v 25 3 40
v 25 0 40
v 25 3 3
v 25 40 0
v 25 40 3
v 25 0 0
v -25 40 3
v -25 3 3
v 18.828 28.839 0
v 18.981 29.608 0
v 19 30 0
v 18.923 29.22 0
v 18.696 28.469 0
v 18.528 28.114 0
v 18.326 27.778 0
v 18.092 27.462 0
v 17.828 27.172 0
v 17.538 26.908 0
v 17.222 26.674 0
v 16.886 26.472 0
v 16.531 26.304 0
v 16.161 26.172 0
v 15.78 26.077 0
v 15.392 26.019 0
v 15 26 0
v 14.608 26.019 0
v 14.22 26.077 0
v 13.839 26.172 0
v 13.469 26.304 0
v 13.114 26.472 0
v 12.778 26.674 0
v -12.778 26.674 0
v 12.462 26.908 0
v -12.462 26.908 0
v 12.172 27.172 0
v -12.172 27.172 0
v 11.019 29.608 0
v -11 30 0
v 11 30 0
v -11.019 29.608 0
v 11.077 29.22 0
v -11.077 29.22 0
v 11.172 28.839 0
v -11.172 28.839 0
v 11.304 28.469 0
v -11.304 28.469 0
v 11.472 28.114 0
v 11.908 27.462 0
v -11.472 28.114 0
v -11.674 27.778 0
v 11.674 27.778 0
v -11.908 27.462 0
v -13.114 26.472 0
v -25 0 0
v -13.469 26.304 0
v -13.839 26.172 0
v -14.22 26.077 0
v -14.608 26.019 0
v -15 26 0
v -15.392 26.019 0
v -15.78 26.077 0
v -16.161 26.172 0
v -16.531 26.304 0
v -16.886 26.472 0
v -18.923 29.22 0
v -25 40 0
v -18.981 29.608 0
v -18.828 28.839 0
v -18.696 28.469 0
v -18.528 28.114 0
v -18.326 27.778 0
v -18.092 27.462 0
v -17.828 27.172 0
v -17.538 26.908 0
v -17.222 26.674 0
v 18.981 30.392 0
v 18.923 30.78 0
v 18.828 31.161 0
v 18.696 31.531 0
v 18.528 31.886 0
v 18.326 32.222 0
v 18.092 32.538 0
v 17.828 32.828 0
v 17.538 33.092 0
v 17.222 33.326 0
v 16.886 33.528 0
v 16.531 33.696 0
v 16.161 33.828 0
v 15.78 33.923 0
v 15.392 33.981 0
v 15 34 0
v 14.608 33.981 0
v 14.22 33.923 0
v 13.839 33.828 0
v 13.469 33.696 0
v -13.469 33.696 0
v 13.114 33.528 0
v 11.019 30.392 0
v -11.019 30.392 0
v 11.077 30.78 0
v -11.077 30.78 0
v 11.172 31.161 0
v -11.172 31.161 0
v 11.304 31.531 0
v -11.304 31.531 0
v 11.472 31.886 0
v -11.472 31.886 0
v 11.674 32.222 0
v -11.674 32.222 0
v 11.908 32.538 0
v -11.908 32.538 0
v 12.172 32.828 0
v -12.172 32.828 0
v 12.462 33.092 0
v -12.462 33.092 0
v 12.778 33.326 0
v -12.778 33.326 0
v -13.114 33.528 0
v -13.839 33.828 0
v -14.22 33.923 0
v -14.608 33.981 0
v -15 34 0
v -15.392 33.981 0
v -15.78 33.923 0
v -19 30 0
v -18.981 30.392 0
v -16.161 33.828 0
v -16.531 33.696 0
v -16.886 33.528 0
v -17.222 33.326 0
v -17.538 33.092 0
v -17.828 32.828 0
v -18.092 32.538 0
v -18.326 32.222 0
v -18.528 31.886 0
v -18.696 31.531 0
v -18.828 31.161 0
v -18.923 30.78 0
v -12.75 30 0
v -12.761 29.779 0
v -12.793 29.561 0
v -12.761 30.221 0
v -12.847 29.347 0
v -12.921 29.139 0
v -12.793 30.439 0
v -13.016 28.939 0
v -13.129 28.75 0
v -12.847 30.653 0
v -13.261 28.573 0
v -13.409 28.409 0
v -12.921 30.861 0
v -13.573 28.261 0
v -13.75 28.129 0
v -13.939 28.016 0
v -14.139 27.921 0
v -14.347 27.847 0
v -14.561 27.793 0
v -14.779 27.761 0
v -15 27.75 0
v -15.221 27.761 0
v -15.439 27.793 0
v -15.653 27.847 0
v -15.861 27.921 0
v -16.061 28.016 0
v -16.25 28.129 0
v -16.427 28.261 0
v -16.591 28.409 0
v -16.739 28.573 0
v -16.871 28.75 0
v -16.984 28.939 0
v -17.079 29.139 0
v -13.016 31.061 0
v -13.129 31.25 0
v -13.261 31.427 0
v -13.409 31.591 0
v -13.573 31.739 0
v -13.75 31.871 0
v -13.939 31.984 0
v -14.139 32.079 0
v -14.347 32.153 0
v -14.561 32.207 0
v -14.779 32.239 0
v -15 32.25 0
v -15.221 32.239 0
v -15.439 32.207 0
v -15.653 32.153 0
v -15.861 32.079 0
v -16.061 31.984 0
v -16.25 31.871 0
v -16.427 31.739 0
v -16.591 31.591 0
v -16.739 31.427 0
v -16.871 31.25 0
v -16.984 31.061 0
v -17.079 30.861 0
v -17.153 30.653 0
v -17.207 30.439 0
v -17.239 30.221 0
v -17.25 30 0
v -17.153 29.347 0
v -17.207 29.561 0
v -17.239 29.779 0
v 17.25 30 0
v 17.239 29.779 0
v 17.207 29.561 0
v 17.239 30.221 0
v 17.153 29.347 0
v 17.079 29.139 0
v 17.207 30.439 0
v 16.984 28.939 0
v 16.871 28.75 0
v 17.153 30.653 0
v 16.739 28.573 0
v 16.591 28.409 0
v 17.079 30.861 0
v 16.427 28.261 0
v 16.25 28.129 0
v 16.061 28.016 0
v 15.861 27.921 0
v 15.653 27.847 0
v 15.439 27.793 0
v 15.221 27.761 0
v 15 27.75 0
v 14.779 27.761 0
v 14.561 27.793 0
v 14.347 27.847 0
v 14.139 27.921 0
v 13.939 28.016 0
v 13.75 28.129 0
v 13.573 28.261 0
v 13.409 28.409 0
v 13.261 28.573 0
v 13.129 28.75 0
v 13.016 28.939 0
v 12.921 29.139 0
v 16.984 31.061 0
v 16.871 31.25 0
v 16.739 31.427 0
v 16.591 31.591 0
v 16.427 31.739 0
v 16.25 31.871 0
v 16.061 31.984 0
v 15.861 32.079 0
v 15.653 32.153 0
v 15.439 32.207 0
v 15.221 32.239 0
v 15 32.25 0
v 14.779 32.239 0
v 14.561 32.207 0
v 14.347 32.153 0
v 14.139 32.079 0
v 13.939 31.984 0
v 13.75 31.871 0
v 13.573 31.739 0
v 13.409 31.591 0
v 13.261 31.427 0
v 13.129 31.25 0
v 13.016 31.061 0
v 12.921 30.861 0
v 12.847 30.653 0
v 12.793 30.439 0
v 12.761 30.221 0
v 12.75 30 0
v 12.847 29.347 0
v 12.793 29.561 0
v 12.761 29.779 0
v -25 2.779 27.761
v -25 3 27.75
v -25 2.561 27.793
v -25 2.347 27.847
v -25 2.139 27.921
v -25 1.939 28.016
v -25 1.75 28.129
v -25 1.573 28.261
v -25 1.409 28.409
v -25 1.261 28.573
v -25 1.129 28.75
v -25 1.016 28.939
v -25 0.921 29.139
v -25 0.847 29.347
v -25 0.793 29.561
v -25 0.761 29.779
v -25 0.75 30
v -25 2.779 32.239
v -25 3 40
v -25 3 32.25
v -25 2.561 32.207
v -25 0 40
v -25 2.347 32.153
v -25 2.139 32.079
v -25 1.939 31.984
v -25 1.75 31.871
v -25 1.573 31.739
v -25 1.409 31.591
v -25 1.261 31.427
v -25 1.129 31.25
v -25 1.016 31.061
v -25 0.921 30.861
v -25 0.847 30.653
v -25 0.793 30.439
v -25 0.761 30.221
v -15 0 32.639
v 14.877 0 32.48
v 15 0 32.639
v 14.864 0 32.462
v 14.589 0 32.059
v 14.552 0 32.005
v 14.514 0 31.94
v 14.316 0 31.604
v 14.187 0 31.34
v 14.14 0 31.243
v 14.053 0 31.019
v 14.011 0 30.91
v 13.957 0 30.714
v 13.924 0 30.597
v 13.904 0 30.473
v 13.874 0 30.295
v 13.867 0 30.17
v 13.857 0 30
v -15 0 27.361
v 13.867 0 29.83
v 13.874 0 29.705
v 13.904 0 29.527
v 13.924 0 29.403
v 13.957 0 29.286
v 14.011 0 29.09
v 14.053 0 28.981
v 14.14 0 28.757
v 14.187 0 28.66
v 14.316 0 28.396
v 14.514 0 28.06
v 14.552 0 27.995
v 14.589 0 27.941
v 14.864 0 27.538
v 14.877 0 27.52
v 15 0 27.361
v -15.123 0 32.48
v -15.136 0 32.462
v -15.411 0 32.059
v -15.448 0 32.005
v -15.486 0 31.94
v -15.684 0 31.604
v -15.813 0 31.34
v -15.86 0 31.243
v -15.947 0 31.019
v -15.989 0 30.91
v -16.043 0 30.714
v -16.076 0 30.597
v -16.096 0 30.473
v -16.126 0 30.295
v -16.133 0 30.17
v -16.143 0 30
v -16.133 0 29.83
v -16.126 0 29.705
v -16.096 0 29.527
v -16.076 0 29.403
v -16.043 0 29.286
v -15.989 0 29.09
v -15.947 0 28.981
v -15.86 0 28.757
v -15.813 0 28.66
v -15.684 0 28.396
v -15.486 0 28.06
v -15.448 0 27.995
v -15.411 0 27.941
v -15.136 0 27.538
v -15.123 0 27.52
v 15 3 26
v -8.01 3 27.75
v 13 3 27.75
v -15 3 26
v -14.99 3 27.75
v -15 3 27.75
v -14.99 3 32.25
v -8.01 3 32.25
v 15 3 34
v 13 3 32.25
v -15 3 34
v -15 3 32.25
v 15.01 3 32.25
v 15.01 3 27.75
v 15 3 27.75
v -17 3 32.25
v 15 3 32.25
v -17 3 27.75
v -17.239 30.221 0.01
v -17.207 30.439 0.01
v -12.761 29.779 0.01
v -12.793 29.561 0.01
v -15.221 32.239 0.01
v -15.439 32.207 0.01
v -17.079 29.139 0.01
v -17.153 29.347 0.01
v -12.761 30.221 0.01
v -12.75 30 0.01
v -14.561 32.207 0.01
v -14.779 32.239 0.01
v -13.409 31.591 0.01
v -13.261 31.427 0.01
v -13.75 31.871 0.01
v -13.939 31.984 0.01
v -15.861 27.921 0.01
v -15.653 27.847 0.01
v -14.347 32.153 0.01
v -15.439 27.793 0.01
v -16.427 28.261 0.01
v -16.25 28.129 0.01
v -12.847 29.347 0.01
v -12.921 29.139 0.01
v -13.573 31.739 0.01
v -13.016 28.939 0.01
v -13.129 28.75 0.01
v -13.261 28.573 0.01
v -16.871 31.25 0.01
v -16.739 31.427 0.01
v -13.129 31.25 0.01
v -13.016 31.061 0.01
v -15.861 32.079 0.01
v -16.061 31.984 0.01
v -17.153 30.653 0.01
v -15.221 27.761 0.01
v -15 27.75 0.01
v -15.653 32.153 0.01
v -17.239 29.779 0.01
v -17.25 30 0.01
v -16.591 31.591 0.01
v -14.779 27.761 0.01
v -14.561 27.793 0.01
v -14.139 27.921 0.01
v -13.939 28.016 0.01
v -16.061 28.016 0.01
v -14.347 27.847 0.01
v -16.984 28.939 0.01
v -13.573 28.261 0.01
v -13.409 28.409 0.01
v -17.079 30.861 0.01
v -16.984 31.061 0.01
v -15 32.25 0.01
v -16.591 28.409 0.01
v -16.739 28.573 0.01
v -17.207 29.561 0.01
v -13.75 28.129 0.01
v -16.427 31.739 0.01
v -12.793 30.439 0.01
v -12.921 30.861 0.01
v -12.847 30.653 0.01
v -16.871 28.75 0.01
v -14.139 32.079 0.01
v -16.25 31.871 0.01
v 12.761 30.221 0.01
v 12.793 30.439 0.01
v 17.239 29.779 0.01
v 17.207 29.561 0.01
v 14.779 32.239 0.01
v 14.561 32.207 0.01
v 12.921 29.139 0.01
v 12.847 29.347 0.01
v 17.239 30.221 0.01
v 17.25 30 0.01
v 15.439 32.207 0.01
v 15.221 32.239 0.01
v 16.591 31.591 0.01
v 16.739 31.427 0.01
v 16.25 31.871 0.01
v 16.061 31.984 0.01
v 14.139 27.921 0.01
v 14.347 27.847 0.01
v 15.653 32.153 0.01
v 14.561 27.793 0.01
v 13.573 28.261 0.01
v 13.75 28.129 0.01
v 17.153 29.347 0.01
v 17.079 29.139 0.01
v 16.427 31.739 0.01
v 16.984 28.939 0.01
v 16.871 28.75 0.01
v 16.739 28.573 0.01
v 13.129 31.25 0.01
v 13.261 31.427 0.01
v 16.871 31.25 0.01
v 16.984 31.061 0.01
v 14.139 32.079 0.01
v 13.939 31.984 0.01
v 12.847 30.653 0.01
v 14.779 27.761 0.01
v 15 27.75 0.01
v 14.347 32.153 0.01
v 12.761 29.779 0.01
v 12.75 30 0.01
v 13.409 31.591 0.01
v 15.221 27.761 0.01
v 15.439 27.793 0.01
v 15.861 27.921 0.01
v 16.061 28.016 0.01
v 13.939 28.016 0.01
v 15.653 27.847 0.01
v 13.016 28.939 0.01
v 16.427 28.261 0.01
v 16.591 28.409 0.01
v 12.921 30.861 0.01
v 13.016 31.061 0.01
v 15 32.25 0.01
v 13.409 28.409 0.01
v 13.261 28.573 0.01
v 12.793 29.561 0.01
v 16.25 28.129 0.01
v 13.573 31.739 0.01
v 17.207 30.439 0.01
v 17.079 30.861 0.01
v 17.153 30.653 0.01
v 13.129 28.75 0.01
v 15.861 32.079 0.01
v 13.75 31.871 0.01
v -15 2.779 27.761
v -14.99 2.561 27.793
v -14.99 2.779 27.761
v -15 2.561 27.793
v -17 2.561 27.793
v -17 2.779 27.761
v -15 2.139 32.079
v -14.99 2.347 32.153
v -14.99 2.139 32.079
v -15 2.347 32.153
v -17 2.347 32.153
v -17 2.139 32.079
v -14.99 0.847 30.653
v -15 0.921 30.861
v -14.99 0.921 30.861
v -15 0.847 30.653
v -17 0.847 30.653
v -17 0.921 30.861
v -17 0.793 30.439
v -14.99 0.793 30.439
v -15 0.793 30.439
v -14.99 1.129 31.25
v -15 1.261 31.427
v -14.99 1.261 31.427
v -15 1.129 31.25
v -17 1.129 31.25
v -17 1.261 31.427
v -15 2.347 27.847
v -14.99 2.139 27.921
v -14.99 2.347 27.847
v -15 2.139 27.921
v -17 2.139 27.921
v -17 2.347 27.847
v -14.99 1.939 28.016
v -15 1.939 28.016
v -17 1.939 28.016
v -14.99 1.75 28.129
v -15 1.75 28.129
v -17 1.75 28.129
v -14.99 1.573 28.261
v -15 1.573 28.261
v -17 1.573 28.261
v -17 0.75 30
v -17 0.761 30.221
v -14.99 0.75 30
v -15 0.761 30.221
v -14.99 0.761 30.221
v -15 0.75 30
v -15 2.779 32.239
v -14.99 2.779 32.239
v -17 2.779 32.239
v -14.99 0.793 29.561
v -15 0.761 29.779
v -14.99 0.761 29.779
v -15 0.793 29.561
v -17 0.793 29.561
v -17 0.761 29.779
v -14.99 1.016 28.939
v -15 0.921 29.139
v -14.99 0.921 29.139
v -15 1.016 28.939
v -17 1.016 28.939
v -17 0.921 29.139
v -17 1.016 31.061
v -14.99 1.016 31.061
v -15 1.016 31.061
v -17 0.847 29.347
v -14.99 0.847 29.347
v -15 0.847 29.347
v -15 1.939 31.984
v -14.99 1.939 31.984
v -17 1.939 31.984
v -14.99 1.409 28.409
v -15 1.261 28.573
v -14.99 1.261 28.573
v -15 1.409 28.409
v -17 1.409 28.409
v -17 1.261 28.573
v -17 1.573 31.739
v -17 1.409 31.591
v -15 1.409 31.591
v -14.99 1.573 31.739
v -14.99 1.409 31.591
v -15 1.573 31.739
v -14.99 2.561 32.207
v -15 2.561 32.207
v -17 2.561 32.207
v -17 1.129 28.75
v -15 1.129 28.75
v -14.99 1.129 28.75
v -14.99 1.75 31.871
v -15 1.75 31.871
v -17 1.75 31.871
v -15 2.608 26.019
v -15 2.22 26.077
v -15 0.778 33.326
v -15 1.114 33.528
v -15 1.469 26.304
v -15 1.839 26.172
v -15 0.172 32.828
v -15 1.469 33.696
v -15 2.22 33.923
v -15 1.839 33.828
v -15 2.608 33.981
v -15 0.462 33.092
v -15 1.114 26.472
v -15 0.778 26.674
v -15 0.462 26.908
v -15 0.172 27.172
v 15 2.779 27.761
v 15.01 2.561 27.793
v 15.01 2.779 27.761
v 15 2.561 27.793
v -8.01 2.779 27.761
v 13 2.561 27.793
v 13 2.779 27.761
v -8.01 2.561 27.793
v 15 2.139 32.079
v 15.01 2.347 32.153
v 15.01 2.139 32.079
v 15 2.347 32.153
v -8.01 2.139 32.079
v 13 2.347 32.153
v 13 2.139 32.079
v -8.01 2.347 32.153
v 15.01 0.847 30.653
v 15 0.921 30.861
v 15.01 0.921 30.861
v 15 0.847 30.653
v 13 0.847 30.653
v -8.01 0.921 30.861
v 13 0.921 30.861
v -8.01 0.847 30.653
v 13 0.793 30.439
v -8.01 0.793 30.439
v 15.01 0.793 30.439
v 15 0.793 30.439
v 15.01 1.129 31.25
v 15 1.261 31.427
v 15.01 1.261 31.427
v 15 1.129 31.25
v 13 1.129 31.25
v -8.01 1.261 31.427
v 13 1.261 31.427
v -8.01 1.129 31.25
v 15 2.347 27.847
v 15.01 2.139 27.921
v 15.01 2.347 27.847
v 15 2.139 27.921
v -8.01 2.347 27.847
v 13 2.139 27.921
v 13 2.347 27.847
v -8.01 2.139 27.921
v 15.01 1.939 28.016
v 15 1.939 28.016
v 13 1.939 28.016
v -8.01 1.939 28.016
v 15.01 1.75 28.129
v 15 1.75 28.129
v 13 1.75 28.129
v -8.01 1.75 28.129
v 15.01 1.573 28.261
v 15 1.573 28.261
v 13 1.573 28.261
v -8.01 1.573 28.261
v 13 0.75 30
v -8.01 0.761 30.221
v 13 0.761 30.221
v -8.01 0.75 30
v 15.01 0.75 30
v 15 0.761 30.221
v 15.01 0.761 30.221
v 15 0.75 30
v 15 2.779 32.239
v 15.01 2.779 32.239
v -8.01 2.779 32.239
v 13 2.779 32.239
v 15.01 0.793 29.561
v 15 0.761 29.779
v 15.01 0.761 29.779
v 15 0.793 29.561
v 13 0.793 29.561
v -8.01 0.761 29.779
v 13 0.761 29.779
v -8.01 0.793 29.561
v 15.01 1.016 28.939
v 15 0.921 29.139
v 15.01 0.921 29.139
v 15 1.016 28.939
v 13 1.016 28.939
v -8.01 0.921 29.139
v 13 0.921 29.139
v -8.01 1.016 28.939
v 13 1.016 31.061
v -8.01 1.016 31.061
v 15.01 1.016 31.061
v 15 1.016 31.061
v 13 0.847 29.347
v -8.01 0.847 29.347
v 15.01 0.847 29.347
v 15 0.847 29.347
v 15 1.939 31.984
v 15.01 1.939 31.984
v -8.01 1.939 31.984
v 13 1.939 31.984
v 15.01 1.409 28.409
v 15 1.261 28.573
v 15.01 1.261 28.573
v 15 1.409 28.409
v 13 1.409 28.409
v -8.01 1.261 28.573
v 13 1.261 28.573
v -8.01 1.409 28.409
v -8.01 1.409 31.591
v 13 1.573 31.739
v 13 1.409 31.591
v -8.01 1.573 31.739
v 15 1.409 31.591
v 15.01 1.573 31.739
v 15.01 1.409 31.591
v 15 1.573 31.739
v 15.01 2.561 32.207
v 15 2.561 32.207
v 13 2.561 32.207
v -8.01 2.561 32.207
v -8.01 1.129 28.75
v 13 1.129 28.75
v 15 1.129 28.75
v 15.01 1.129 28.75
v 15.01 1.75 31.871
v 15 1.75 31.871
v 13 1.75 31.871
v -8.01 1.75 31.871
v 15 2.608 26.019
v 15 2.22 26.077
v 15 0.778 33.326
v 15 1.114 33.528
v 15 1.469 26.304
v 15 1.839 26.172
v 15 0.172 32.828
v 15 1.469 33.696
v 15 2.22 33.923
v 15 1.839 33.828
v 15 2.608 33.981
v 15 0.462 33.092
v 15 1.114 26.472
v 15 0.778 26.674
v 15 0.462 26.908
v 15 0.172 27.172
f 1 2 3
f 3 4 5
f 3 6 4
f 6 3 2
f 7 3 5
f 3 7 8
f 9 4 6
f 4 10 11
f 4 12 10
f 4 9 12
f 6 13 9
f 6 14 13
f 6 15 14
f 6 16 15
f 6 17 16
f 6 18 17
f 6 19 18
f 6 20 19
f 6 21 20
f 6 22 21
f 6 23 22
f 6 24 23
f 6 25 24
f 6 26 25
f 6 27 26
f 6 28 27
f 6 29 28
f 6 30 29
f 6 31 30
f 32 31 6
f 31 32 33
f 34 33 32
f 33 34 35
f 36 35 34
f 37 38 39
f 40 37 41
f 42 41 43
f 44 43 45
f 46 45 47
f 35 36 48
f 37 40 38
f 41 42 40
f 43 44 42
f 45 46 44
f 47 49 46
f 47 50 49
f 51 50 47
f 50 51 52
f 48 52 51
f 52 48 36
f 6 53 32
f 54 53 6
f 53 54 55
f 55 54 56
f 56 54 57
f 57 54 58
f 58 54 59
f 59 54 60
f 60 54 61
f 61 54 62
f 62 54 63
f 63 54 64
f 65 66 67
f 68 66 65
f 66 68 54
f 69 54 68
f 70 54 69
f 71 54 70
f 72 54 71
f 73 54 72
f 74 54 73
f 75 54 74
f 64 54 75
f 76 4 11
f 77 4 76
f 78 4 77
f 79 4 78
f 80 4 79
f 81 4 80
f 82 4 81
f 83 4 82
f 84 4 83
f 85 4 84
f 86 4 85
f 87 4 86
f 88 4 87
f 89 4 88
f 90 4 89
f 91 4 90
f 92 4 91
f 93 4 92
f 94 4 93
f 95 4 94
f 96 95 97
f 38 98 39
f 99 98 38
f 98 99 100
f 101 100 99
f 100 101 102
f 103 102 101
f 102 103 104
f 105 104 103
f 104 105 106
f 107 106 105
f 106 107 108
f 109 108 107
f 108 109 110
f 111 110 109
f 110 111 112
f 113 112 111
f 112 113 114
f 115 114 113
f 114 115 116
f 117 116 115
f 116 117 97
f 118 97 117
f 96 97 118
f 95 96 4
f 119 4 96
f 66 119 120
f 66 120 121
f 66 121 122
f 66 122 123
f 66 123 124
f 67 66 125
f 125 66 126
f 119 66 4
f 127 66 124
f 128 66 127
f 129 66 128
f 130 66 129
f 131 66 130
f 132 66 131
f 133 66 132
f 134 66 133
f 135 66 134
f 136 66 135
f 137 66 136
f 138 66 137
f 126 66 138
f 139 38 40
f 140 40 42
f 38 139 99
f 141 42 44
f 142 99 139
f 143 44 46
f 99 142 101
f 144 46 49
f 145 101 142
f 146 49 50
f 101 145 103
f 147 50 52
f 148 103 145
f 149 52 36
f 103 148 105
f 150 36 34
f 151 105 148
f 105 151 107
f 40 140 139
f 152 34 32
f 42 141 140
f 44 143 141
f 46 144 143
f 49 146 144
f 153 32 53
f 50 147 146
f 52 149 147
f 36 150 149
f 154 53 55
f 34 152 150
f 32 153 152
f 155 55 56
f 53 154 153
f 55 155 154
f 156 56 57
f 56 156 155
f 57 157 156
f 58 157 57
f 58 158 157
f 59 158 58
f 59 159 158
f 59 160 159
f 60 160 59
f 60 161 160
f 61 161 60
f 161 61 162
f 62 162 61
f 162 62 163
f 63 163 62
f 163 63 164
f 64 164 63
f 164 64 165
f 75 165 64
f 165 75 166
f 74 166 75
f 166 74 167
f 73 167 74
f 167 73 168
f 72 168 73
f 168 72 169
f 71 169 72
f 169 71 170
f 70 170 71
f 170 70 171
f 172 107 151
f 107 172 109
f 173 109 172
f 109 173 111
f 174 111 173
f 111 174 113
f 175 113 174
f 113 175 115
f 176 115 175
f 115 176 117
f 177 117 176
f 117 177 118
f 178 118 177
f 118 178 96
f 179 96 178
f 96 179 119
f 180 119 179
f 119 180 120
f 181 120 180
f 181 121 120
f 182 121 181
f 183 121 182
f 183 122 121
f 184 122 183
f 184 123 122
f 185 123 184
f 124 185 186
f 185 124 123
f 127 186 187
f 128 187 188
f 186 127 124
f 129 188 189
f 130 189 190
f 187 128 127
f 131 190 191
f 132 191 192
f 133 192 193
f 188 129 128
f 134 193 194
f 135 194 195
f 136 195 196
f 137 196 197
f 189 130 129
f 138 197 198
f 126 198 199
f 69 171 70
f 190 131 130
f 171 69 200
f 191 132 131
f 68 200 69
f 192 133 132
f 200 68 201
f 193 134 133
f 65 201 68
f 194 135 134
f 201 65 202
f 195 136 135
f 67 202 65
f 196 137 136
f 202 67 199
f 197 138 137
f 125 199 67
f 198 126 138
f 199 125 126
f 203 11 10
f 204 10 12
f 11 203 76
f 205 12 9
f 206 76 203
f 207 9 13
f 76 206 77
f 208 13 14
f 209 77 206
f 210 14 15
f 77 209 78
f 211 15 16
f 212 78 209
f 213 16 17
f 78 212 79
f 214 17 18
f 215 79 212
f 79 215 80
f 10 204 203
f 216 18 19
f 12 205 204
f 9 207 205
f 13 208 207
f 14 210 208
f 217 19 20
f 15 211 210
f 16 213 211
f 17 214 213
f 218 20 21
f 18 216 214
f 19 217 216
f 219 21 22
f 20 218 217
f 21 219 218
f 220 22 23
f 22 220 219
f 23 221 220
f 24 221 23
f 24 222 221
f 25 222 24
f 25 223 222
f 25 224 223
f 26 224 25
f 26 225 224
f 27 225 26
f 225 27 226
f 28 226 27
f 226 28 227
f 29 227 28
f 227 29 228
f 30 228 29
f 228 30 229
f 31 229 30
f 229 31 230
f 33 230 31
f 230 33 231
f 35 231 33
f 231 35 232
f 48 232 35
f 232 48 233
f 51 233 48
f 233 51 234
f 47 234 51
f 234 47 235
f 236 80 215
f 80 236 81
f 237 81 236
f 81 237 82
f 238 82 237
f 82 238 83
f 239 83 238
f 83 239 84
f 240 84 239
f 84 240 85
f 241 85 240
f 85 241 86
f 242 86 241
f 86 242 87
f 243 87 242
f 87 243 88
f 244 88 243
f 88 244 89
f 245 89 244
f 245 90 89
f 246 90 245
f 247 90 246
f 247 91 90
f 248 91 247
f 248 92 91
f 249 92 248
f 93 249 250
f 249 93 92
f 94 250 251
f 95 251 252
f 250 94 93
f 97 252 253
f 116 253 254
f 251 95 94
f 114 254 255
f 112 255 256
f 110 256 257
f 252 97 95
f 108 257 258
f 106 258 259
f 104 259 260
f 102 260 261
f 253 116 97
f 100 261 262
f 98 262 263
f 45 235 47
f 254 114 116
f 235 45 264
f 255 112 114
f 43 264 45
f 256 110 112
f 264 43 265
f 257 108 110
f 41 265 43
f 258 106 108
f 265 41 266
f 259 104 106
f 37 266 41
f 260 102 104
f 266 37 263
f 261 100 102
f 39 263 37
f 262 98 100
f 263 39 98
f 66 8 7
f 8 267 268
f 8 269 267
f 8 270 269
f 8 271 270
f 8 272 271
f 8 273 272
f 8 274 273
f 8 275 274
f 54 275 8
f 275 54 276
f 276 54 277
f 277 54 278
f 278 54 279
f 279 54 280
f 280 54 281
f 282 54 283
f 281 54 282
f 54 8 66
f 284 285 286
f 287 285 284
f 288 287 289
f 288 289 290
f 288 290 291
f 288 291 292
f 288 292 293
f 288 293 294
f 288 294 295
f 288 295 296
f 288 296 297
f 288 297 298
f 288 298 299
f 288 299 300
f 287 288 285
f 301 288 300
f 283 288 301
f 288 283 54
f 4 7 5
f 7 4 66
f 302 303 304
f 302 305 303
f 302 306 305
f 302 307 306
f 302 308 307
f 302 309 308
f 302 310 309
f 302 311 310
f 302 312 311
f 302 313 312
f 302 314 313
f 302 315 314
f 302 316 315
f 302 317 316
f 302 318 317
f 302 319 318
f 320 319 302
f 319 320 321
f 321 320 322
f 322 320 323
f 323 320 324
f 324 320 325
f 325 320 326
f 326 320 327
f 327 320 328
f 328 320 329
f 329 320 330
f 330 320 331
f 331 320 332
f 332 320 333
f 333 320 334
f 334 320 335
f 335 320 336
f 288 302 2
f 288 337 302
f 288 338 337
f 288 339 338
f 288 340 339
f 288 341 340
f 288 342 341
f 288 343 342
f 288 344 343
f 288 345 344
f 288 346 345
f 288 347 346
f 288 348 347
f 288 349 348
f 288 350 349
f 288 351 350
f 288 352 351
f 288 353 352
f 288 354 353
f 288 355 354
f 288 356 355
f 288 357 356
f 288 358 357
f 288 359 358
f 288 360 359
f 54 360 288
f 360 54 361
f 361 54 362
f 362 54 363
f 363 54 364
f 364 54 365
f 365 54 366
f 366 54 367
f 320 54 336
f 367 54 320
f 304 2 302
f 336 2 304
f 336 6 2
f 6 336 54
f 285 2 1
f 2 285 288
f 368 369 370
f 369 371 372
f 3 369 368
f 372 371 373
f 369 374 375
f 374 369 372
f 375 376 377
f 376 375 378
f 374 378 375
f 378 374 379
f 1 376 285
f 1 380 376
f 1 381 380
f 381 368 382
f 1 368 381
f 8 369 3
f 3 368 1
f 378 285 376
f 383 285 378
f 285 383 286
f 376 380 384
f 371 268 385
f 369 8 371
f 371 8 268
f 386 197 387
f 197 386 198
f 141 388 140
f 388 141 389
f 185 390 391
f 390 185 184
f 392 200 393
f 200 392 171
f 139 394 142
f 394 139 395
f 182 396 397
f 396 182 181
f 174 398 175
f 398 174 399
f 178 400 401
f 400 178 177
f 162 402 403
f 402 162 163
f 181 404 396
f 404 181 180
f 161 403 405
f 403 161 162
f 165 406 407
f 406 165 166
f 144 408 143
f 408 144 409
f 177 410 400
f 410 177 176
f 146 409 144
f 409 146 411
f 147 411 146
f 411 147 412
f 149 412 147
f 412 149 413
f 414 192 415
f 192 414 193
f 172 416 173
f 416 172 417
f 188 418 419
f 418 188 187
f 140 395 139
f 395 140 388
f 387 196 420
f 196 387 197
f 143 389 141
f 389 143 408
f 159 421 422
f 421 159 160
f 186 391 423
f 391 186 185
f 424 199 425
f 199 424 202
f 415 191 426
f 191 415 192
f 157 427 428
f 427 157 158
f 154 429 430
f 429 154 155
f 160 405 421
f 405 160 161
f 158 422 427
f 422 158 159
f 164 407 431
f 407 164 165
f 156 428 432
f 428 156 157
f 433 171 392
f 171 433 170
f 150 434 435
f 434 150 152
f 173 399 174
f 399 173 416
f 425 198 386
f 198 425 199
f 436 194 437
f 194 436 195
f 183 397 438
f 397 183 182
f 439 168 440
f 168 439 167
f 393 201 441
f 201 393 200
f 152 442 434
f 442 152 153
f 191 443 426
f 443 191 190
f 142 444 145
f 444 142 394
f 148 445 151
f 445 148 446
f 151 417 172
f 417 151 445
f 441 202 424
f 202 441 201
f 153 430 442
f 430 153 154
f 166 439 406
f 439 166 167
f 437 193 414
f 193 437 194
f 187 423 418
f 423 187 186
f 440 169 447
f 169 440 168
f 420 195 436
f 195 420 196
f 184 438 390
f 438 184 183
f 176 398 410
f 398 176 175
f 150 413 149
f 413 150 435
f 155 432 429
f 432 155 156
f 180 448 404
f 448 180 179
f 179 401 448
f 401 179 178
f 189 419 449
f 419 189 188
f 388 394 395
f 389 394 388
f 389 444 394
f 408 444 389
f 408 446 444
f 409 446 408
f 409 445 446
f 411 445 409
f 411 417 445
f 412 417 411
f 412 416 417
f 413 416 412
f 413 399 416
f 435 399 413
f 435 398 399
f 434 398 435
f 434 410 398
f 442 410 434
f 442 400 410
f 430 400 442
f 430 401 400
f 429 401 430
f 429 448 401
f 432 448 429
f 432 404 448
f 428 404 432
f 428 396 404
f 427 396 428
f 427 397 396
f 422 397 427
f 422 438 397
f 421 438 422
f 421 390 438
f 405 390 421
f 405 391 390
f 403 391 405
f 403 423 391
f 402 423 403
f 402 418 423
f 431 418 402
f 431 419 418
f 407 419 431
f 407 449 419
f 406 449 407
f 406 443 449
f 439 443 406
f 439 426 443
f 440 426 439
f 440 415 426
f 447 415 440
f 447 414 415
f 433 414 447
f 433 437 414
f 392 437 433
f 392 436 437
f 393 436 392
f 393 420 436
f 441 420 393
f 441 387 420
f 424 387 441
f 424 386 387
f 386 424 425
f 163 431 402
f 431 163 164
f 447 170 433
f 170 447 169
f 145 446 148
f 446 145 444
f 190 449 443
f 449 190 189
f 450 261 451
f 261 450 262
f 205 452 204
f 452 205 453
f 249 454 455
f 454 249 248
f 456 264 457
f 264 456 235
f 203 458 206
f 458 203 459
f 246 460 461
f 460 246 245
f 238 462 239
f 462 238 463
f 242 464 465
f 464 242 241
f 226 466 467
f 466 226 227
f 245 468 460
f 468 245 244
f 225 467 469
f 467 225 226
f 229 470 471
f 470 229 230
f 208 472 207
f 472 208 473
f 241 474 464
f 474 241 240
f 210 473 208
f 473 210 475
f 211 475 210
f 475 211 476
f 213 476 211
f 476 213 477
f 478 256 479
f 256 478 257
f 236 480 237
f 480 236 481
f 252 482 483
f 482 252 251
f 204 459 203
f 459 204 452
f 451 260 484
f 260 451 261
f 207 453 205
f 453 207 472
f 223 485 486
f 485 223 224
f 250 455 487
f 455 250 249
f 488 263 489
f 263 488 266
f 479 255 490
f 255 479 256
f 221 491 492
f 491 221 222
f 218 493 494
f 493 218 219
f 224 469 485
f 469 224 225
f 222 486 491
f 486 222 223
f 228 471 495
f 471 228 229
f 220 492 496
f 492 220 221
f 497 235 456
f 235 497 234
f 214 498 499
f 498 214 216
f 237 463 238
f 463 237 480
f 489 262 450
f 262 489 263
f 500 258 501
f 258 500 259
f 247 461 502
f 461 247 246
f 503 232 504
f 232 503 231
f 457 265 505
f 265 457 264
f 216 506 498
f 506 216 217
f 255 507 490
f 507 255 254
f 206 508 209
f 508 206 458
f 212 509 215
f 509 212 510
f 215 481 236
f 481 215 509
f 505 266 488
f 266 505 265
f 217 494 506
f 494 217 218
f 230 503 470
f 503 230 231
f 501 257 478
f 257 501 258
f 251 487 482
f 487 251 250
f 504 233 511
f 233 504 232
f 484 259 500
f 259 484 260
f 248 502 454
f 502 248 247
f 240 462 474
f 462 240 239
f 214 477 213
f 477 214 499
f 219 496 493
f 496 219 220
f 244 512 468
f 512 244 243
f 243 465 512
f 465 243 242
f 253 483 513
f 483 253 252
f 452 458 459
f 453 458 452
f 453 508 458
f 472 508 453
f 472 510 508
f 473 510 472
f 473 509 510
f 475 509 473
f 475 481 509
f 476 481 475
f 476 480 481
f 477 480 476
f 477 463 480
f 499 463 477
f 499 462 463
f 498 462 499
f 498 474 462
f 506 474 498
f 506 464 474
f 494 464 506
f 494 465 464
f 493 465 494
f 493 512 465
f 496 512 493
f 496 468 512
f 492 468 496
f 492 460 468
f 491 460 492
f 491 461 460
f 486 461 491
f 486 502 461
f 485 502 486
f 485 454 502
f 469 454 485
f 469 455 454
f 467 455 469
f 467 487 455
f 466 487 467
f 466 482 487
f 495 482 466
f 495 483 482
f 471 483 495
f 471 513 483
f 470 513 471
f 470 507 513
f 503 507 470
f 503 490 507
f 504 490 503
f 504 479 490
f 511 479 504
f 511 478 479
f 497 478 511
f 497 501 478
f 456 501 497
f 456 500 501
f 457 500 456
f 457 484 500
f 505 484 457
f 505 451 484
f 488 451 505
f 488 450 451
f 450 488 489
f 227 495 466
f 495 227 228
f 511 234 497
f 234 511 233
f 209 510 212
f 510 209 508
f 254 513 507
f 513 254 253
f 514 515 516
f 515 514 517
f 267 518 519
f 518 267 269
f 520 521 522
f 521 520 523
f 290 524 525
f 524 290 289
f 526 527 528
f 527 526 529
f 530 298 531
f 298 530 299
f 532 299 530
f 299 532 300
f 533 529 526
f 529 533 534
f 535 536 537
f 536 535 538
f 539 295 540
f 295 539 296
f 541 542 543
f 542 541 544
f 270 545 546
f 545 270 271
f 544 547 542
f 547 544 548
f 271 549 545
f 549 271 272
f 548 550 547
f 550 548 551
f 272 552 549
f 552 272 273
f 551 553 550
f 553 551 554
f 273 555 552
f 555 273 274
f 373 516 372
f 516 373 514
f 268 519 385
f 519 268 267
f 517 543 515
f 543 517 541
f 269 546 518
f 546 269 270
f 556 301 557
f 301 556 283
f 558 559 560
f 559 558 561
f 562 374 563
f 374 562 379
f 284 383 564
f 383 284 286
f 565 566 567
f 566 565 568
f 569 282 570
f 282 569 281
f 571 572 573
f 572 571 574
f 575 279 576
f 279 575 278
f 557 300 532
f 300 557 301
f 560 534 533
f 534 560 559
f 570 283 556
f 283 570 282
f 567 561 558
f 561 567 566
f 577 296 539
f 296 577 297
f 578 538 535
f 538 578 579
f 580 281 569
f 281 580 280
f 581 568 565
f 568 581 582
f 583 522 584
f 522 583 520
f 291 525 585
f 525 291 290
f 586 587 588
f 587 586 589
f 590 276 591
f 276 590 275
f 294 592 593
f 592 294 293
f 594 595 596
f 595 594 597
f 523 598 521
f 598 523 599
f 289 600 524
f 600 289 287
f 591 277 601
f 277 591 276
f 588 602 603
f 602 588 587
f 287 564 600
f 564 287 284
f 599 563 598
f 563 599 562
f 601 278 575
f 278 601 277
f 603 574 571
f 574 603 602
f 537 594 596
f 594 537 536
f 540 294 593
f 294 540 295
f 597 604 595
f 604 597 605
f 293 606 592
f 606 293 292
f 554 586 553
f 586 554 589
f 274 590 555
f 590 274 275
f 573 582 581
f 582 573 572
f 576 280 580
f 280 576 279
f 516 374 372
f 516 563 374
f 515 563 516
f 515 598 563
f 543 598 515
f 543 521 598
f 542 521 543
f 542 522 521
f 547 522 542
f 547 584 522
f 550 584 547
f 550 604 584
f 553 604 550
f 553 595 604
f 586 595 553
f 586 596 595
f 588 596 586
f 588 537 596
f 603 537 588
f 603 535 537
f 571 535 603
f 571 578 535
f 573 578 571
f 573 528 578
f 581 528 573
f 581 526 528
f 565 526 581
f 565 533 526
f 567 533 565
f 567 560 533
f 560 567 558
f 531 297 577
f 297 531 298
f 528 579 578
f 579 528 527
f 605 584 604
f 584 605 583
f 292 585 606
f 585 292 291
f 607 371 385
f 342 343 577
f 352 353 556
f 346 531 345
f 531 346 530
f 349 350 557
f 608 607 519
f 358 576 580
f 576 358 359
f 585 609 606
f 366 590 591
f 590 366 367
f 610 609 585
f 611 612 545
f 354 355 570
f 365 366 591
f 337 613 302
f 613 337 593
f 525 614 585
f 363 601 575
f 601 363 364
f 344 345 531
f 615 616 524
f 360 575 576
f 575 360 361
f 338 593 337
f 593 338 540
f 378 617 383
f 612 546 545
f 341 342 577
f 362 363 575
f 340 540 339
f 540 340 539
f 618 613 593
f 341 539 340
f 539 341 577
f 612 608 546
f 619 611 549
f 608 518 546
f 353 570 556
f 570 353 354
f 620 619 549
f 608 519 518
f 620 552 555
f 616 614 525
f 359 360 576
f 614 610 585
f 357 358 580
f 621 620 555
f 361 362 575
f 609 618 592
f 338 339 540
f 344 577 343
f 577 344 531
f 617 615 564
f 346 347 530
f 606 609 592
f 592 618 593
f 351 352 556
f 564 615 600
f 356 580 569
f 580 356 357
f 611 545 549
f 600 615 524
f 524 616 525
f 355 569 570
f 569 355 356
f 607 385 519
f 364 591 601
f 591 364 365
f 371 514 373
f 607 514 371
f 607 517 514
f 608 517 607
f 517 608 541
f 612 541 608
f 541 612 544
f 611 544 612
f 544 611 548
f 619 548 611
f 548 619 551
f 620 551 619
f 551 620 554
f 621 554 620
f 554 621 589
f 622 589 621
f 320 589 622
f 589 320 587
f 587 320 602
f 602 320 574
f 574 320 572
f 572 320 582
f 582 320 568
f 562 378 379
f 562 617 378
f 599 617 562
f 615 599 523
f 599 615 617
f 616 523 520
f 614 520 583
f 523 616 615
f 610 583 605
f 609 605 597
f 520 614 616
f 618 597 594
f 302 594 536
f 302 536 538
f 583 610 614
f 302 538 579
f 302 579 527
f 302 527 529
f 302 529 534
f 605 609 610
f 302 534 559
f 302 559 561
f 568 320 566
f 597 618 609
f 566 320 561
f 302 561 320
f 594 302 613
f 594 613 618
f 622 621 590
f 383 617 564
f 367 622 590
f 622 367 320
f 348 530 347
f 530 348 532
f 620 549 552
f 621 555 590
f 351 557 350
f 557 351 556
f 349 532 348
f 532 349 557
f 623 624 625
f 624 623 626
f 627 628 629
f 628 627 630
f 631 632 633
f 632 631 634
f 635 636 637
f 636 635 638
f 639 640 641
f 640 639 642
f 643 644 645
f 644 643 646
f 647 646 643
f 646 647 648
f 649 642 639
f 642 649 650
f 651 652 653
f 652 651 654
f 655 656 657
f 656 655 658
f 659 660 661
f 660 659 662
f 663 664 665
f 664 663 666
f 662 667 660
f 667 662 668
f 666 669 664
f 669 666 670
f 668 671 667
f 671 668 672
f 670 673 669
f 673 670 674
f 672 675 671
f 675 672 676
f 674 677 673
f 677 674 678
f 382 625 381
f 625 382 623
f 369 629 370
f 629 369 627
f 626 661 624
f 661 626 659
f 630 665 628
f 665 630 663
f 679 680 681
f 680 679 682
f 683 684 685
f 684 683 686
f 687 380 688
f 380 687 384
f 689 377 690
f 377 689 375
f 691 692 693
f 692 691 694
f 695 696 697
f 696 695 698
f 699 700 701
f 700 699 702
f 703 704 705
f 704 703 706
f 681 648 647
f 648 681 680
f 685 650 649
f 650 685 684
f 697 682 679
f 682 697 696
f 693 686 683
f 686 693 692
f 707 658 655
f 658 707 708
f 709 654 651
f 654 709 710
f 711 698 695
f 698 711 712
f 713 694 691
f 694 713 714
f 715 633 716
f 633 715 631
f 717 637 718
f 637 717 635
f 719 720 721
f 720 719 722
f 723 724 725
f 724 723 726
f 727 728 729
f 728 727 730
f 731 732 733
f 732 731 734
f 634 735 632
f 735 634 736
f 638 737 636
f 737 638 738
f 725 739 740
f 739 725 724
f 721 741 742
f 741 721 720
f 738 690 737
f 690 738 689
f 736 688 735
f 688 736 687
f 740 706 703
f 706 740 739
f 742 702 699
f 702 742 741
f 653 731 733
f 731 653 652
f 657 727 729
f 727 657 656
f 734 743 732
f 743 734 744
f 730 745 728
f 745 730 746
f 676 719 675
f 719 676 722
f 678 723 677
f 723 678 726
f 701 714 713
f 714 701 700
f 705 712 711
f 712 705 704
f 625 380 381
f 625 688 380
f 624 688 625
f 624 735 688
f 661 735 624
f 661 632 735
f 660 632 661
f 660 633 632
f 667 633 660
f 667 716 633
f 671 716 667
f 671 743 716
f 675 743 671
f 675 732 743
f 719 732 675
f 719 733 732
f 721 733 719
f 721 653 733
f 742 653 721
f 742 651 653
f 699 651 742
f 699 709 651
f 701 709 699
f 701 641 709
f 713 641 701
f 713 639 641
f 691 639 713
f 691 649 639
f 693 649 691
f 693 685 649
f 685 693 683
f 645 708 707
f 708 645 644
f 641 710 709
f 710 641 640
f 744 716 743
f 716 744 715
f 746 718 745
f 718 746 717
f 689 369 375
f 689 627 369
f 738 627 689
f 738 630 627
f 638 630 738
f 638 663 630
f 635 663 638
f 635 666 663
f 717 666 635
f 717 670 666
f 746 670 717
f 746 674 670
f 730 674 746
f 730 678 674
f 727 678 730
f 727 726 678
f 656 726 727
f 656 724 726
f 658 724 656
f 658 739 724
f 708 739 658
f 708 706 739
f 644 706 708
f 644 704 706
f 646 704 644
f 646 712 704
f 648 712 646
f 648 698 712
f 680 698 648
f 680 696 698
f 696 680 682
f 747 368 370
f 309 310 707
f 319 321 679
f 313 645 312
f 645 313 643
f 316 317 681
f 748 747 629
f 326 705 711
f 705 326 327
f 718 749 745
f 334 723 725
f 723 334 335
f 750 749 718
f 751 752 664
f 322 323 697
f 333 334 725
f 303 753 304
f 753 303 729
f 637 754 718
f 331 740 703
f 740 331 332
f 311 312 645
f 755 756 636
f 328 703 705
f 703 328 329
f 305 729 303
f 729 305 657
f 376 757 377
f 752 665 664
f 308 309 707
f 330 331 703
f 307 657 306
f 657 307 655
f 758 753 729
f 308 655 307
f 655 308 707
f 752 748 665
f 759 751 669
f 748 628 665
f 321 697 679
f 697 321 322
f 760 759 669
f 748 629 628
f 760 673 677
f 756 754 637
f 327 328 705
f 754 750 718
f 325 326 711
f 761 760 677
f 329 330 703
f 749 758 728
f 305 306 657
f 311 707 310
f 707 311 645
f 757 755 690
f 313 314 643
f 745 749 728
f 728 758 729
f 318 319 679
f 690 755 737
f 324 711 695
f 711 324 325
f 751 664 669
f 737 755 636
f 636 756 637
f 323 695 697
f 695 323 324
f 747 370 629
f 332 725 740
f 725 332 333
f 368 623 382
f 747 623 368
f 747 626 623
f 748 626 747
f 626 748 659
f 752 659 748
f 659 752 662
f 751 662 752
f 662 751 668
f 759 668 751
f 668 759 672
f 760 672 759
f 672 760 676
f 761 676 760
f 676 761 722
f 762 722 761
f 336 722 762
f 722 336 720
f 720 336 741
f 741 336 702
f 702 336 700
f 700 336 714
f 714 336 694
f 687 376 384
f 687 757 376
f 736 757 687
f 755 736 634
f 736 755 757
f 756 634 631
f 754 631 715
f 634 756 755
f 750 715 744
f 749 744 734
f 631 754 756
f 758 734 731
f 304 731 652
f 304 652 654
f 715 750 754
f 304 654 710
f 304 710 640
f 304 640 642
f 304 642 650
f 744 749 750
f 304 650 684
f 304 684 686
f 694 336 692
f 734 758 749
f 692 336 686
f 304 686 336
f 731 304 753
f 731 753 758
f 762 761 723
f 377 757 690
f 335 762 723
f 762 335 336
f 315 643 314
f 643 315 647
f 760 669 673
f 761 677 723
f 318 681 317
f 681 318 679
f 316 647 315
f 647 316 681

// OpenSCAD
// L-bracket with 4x M4 countersunk holes (2 per flange)
// Inner corner at origin: horizontal flange extends +Y, vertical flange extends +Z

$fn = 64;

module countersunk_hole(
    shaft_d = 4.5,     // through hole Ø
    head_d  = 8,       // countersink seat Ø
    head_h  = 2,       // countersink depth
    through  = 200     // long enough for bores
){
    // Cut sequence along +Z axis (default cylinder axis)
    // Countersink seat (flat at top): place cone so its top is at z=0
    // Then drill through.
    union() {
        // through hole
        translate([0,0,-0.01])
            cylinder(h = through + 0.02, d = shaft_d, center = false);

        // countersink: cone with top at z=0, going to -head_h
        // Use d1 (top) = head_d, d2 (bottom) ~ shaft_d
        translate([0,0,0])
            cylinder(h = head_h, d1 = head_d, d2 = shaft_d, center = false);
    }
}

module l_bracket() {
    w = 50;      // width (X)
    d = 40;      // depth/height along +Y for horizontal, +Z for vertical
    t = 3;       // thickness for both flanges

    // hole positions:
    // "面の中心線上で、面の縁から 10mm 内側、左右対称に2個"
    // For each flange: X is centered -> holes at x = ±(w/2 - 10)
    // For horizontal flange: distance from outer edge (+Y) inward -> y = (d - 10)
    // For vertical flange: distance from outer edge (+Z) inward -> z = (d - 10)
    hx = [-(w/2 - 10), +(w/2 - 10)];
    hy = d - 10;
    hz = d - 10;

    difference() {
        union() {
            // Horizontal flange: size w (X) x d (Y) x t (Z), Z in [0, t]
            translate([-w/2, 0, 0])
                cube([w, d, t]);

            // Vertical flange: size w (X) x t (Y thickness) x d (Z), Y in [0, t], Z in [0, d]
            translate([-w/2, 0, 0])
                cube([w, t, d]);
        }

        // --- Horizontal flange holes ---
        // Outer side for bolt head: outside face at +Z (top of horizontal flange)
        // Therefore countersink should face +Z.
        // Hole axis: Z (through thickness in Z)
        for (x = hx) {
            translate([x, hy, 0])  // start at bottom of flange
                rotate([180,0,0])  // make countersink face +Z (top at +Z)
                    countersunk_hole(shaft_d=4.5, head_d=8, head_h=2, through=t + 20);
        }

        // --- Vertical flange holes ---
        // Outer side for bolt head: outside face at +Y (away from inside corner)
        // Hole axis: Y through thickness t.
        // Build in Y: map default Z-axis model to Y-axis.
        for (x = hx) {
            translate([x, t, hz])   // place at outer face +Y, z=hz
                rotate([0,90,0])    // rotate Z-axis hole to Y-axis
                    // Also flip so countersink seat opens toward +Y (outer side)
                    rotate([180,0,0])
                        countersunk_hole(shaft_d=4.5, head_d=8, head_h=2, through=t + 20);
        }
    }
}

l_bracket();
